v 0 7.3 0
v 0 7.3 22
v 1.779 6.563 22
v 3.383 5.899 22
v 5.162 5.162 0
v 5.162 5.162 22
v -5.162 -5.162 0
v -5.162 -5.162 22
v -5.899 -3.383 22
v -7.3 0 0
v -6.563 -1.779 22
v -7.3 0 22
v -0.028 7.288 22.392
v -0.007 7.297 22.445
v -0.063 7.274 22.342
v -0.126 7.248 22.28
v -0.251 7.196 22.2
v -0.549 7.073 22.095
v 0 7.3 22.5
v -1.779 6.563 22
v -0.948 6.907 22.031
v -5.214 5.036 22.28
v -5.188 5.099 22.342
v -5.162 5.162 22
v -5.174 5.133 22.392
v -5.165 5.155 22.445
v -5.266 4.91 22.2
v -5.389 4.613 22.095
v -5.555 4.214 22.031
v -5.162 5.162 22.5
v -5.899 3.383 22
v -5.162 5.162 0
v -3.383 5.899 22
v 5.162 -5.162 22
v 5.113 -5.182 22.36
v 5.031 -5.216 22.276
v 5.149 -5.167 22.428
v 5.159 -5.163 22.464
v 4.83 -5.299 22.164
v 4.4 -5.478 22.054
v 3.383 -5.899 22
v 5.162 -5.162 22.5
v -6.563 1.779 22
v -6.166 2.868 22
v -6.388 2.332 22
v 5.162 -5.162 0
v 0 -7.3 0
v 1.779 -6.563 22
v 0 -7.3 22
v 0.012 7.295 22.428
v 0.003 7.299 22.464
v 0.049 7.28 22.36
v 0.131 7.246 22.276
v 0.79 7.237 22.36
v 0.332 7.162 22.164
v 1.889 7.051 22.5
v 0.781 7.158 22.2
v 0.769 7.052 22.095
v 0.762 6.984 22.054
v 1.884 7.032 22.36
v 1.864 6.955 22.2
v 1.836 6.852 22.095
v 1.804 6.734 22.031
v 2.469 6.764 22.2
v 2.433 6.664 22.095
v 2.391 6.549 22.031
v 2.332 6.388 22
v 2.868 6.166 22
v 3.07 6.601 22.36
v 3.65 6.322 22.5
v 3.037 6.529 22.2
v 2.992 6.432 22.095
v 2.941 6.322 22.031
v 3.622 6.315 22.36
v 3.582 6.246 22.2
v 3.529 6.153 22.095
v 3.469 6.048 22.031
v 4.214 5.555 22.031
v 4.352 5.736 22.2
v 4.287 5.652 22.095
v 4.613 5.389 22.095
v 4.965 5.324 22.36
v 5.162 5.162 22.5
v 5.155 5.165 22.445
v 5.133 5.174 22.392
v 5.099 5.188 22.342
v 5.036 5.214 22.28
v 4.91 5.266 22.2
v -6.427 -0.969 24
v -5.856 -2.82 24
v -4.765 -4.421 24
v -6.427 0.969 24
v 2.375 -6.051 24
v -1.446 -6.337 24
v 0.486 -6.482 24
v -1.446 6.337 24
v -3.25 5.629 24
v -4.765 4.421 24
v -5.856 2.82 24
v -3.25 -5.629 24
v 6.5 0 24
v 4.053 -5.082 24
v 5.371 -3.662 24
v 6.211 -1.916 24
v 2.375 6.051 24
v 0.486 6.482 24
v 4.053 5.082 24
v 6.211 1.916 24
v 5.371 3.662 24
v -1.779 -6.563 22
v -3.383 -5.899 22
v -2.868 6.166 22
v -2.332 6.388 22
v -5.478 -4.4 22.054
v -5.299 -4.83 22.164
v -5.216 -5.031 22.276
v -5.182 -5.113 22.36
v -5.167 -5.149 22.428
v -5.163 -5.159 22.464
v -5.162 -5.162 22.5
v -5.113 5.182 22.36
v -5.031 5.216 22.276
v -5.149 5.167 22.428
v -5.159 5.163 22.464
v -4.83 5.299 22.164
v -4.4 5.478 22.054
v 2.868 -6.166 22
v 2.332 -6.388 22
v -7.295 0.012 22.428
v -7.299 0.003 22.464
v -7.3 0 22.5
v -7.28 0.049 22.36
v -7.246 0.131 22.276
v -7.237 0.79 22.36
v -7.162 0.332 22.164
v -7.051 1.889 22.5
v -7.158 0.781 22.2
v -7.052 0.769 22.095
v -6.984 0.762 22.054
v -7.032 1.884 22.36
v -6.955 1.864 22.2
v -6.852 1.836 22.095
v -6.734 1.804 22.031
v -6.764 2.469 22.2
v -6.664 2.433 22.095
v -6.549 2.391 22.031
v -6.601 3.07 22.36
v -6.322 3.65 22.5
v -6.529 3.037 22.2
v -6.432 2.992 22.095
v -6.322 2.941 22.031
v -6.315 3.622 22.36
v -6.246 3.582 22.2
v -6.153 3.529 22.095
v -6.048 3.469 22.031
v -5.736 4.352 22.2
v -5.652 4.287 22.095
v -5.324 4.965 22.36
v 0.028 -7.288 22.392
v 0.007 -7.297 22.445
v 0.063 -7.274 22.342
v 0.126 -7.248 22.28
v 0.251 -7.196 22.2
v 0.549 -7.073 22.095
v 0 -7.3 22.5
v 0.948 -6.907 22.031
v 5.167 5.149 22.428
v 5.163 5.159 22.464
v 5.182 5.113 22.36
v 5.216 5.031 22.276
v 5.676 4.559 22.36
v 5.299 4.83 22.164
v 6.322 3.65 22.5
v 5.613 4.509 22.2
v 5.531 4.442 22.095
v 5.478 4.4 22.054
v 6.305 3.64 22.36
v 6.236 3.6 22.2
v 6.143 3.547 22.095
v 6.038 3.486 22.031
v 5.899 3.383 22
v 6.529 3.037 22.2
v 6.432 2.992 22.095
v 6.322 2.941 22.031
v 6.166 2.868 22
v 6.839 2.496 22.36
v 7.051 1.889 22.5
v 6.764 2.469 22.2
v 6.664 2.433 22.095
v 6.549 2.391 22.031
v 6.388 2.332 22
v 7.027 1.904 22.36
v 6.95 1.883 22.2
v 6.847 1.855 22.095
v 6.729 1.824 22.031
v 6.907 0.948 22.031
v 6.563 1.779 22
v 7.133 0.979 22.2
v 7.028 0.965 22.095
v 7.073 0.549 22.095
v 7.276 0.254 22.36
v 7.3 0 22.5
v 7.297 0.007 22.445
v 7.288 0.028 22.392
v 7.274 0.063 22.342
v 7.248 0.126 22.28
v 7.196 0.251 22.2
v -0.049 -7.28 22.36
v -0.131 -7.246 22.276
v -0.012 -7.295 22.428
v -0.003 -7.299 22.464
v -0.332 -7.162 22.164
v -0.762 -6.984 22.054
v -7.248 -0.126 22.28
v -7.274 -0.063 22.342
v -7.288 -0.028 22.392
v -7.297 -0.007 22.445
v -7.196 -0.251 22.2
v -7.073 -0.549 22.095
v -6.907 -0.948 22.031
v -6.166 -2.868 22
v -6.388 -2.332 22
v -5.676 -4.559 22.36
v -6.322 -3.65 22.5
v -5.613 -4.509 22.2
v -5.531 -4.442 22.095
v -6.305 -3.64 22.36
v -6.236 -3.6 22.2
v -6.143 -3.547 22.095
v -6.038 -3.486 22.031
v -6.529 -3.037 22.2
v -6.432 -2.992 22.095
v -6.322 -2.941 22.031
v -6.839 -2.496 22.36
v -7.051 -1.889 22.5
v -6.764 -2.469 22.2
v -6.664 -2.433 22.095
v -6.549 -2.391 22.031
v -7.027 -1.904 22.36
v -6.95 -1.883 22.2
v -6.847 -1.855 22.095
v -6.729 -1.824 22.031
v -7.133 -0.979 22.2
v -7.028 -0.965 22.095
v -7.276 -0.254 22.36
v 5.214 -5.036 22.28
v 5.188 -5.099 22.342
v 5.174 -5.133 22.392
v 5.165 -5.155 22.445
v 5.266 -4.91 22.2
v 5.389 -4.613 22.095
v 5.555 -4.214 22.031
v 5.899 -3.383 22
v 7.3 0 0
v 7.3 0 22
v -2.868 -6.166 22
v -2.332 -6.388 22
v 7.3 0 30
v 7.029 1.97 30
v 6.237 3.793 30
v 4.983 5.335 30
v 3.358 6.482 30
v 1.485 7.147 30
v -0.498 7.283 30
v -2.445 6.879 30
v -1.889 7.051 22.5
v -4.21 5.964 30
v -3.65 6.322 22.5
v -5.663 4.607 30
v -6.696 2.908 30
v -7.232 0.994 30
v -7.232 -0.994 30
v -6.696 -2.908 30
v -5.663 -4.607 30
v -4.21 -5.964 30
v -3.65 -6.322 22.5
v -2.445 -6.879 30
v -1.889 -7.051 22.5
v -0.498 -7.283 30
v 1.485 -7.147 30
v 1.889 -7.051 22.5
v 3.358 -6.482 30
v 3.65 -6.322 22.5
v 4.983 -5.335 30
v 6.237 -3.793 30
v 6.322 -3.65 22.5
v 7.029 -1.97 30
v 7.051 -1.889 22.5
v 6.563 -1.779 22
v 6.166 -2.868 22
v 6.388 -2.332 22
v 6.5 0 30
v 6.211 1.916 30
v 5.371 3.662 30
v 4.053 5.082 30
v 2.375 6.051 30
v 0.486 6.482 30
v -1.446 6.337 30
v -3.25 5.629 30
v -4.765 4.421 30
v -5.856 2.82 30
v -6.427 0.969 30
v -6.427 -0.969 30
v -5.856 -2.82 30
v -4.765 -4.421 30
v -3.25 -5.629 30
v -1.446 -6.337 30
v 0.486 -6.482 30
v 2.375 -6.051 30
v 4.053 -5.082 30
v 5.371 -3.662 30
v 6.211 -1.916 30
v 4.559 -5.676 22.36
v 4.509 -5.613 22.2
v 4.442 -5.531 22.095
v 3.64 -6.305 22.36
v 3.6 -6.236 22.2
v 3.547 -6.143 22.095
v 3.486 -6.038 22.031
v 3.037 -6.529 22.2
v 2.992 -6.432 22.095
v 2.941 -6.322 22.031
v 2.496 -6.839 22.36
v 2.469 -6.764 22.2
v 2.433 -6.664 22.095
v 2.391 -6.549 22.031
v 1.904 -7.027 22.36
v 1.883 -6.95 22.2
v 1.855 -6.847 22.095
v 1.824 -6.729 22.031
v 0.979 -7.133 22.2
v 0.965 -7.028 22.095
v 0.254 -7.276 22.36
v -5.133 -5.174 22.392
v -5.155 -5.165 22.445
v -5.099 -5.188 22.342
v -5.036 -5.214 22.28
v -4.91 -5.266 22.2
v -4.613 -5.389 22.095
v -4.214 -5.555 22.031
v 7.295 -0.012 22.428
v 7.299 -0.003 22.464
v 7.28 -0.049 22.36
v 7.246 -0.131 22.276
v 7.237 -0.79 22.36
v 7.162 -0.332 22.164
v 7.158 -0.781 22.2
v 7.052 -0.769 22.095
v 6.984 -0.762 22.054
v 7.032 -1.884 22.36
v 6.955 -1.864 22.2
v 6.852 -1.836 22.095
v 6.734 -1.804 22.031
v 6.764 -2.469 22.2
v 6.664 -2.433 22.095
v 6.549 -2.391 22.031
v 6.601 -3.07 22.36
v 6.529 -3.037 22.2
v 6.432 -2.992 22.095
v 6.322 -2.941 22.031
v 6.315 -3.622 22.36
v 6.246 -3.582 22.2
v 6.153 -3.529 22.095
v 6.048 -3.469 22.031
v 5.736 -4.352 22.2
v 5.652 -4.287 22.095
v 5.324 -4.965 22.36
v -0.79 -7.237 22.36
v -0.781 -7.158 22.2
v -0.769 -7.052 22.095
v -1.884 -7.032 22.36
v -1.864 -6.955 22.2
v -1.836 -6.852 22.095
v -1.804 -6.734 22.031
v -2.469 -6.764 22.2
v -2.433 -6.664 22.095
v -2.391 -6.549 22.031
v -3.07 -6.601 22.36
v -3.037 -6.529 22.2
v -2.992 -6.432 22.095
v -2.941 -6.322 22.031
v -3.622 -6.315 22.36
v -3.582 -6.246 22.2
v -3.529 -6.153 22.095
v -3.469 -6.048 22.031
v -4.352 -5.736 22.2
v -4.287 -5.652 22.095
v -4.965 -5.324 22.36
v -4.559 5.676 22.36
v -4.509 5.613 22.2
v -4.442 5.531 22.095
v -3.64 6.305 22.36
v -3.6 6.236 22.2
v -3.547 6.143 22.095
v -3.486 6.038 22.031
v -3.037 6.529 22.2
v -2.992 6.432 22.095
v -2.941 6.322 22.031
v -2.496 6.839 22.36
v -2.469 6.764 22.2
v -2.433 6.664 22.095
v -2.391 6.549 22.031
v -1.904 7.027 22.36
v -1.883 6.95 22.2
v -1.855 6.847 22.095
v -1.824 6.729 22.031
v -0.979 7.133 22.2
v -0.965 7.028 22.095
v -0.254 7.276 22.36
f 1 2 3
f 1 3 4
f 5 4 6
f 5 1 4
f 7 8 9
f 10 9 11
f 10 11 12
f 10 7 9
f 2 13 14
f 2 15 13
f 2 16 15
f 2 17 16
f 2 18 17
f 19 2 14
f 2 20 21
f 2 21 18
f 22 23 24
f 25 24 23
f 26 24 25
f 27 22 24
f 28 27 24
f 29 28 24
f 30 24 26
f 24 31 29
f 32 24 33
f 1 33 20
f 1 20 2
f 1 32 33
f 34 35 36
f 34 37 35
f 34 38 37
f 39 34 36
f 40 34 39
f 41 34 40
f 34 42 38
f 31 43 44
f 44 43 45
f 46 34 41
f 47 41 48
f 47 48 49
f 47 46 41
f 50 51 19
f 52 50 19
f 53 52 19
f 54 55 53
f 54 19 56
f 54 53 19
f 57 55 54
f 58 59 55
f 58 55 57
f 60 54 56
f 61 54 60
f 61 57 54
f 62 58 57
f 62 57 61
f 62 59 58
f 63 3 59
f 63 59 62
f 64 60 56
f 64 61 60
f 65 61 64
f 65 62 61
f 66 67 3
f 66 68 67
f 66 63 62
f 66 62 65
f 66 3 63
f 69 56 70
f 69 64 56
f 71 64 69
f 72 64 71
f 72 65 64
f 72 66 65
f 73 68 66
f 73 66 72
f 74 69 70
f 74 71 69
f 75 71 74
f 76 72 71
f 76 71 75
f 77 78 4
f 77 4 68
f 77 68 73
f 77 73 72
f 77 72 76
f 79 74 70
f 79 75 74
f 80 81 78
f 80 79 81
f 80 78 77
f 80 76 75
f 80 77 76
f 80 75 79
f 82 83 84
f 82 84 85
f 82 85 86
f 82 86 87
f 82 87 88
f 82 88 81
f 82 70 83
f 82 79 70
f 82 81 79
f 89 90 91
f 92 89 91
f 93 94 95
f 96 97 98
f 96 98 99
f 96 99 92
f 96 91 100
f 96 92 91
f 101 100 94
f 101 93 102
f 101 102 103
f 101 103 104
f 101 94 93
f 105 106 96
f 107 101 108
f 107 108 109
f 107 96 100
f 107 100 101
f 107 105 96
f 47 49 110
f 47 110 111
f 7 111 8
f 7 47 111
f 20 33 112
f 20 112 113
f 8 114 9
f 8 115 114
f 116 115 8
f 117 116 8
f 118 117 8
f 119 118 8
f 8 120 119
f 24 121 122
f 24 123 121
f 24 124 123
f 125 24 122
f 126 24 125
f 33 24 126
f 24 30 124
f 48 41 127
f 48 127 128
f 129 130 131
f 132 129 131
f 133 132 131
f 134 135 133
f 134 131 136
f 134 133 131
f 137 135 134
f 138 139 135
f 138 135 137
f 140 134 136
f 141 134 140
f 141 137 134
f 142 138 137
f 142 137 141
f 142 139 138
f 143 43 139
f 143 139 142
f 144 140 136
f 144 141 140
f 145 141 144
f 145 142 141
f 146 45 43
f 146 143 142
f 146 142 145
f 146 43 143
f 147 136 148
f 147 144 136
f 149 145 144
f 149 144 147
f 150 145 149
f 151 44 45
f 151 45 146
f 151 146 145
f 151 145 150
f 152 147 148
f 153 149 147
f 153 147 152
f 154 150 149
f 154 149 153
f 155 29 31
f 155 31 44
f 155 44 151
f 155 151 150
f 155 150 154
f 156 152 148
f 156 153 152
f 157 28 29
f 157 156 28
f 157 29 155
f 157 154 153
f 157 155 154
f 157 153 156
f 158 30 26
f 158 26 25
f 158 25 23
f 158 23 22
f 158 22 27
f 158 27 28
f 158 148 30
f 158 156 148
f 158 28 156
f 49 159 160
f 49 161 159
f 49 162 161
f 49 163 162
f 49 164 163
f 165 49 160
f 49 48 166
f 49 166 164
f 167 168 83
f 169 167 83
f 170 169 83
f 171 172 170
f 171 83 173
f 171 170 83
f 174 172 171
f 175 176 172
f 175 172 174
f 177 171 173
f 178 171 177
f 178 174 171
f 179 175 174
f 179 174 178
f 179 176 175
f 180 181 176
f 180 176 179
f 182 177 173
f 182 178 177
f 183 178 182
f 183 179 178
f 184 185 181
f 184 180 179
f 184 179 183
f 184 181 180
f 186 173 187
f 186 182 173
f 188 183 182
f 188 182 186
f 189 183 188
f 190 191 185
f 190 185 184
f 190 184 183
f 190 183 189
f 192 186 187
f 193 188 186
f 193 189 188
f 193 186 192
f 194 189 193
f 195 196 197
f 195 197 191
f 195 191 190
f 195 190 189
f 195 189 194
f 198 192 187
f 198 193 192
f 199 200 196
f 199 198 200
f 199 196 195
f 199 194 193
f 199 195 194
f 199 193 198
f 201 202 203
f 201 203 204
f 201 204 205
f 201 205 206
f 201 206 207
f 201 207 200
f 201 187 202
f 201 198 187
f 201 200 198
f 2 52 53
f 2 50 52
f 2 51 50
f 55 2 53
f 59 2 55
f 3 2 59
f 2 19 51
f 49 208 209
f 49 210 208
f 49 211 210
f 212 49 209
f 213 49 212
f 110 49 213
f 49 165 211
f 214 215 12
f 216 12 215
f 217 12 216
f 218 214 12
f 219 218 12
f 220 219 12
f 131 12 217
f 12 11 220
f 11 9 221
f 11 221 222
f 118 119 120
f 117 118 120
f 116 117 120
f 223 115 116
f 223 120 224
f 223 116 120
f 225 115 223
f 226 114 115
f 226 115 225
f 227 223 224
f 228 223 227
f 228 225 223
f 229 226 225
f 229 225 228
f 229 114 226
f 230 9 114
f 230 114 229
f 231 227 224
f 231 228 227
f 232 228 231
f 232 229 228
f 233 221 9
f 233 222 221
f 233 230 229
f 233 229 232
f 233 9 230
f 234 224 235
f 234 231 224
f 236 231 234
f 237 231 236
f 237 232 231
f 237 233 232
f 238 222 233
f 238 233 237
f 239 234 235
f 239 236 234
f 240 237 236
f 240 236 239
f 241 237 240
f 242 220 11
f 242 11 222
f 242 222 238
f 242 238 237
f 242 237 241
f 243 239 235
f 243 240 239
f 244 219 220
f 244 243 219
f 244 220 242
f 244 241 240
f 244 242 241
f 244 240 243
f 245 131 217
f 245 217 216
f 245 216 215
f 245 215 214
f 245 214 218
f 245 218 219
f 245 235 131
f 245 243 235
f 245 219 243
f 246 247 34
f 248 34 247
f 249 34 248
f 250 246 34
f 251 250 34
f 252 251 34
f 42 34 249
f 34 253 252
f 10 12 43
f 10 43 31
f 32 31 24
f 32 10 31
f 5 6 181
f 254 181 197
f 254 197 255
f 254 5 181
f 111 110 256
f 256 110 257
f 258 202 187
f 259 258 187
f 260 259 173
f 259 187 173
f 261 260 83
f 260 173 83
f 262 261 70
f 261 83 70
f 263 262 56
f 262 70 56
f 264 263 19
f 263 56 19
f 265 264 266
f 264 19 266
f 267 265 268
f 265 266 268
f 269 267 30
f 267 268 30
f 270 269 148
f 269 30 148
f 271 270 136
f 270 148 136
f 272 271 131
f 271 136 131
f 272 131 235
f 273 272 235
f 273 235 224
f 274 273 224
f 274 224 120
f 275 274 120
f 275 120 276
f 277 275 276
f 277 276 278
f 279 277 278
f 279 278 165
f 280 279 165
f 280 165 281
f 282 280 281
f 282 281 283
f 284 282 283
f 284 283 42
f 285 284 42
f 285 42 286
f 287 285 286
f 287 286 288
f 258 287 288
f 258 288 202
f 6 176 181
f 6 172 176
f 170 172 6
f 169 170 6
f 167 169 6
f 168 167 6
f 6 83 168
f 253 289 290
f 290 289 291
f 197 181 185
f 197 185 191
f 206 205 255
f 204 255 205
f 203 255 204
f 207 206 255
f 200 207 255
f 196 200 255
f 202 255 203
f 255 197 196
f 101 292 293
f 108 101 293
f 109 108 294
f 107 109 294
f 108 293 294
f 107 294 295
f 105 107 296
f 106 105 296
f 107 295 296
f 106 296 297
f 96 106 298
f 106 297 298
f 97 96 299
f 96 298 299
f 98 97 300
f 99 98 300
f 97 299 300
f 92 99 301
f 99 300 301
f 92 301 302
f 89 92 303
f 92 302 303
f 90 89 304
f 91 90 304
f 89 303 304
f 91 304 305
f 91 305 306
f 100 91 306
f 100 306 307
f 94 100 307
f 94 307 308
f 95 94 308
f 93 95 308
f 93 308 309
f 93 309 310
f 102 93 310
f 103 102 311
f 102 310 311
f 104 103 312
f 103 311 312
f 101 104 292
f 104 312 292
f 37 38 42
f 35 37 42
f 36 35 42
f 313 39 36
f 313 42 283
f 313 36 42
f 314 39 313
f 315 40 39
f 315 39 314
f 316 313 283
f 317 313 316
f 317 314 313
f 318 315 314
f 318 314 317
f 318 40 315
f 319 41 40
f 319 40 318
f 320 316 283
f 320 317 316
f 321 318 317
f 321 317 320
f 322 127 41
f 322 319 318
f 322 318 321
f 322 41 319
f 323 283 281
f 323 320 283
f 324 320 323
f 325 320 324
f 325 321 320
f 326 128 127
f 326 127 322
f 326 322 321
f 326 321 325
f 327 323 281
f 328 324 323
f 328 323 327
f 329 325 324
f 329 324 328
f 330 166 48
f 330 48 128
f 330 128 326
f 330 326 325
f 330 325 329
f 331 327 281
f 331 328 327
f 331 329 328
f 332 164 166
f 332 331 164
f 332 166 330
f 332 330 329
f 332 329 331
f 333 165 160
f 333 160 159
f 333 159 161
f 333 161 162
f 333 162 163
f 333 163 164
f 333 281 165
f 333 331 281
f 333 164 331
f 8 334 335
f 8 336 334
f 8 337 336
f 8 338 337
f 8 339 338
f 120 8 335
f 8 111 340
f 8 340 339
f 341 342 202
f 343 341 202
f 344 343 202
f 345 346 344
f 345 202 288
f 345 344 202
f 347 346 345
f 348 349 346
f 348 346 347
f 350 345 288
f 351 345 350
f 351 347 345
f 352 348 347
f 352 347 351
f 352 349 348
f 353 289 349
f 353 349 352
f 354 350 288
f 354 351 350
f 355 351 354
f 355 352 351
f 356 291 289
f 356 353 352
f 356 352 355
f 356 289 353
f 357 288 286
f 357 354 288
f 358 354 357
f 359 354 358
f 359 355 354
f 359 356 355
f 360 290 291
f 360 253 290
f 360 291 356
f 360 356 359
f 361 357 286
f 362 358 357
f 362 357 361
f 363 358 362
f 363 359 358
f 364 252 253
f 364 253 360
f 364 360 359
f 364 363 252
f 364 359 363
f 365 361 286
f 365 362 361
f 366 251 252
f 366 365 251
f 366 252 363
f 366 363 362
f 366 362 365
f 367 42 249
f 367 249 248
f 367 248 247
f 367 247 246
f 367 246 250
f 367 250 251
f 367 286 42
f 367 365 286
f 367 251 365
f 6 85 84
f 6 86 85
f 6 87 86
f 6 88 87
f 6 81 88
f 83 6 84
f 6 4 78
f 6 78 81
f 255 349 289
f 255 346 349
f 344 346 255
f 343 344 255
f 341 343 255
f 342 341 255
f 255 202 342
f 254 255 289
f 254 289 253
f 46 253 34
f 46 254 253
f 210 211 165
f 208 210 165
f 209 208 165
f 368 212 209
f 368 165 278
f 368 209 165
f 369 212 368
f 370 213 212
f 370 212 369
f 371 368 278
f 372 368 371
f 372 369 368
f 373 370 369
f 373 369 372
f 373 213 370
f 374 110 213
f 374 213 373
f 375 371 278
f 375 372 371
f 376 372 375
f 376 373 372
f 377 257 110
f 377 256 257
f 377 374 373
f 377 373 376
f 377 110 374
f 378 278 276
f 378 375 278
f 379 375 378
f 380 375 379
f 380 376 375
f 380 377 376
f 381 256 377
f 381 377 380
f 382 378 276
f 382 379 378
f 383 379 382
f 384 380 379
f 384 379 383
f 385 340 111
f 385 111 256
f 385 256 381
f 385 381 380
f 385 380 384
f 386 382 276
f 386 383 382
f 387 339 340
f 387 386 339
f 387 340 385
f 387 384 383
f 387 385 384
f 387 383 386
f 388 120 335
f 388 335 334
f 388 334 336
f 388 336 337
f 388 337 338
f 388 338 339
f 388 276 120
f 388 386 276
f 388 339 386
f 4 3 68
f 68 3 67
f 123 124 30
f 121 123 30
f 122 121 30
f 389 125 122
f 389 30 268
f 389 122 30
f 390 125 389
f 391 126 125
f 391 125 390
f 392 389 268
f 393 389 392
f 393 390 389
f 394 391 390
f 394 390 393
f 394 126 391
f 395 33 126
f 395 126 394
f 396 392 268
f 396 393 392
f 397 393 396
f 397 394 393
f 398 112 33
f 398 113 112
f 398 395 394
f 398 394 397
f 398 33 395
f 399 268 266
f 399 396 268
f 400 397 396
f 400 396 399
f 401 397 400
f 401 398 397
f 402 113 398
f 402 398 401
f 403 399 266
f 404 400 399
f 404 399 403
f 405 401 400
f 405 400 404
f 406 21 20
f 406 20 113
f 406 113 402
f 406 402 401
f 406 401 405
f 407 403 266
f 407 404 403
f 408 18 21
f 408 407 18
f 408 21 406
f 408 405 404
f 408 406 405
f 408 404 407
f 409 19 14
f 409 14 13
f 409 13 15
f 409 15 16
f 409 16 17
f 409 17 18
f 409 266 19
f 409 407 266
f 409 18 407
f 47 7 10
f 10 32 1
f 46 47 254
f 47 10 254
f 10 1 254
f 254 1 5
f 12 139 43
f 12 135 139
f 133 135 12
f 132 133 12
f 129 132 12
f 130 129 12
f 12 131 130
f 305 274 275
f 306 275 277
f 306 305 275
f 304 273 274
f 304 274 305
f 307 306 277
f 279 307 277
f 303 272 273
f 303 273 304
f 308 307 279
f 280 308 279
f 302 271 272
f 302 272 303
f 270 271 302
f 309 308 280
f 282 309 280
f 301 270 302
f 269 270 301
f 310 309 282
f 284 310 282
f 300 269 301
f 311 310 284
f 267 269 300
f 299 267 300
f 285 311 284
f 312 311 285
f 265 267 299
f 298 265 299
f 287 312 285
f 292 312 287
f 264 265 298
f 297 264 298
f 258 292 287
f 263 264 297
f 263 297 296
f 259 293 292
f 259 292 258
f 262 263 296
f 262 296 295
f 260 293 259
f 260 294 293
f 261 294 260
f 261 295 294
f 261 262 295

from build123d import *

# Parameters (mm, degrees)
SKETCH1_R           = 7.3
BOSS_EXTRUDE1_DEPTH = 30
SKETCH2_R           = 6.5
CUT_EXTRUDE1_DEPTH  = 6
SKETCH3_OUTSIDE_W   = 23.884
SKETCH3_OUTSIDE_H   = 23.884
CUT_EXTRUDE3_DEPTH  = 22
FILLET2_R           = 0.5


with BuildPart() as part:
    # Sketch1 → Boss-Extrude1 (new body)
    with BuildSketch(Plane.XY):
        Circle(SKETCH1_R)
    extrude(amount=BOSS_EXTRUDE1_DEPTH)

    # Sketch2 → Cut-Extrude1 (cut)
    with BuildSketch(Plane.XY.offset(30)):
        Circle(SKETCH2_R)
    extrude(amount=-CUT_EXTRUDE1_DEPTH, mode=Mode.SUBTRACT)

    # Sketch3 outside → Cut-Extrude3 (cut)
    with BuildSketch(Plane(origin=(0, 0, 0), x_dir=(-1, 0, 0), z_dir=(0, 0, -1))):
        Rectangle(SKETCH3_OUTSIDE_W, SKETCH3_OUTSIDE_H)
        Polygon((7.3, 0), (5.161879503, 5.161879503), (0, 7.3), (-5.161879503, 5.161879503), (-7.3, 0), (-5.161879503, -5.161879503), (0, -7.3), (5.161879503, -5.161879503), align=None, mode=Mode.SUBTRACT)
    extrude(amount=-CUT_EXTRUDE3_DEPTH, mode=Mode.SUBTRACT)

    # Fillet2
    # the kernel refuses this fillet: 0.5 mm, written as the material it takes off along each edge
    with BuildSketch(Plane(origin=(0, 0, 22), x_dir=(1, 0, 0), z_dir=(0, 1, 0))) as fillet2_piece_1_section:
        with BuildLine():
            CenterArc((7.3 - FILLET2_R, -FILLET2_R), FILLET2_R, 0, 90)
            Line((7.3, -FILLET2_R), (7.3, 0))
            Line((7.3, 0), (7.3 - FILLET2_R, 0))
        make_face()
    fillet2_piece_1 = revolve(axis=Axis((0, 0, 22), (0, 0, -1)), revolution_arc=45, mode=Mode.PRIVATE)
    fillet2_piece_1 = split(fillet2_piece_1, bisect_by=Plane(origin=(6.230939751, -2.580939751, 22.141608604), z_dir=(0.9238795325112824, -0.3826834323651005, 0)), keep=Keep.TOP, mode=Mode.PRIVATE)
    add(fillet2_piece_1, mode=Mode.SUBTRACT)
    with BuildSketch(Plane(origin=(0, 0, 22), x_dir=(0.7071067811865394, -0.7071067811865557, 0), z_dir=(0.7071067811865557, 0.7071067811865394, 0))) as fillet2_piece_2_section:
        with BuildLine():
            CenterArc((7.3 - FILLET2_R, -FILLET2_R), FILLET2_R, 0, 90)
            Line((7.3 - FILLET2_R, 0), (7.3, 0))
            Line((7.3, 0), (7.3, -FILLET2_R))
        make_face()
    fillet2_piece_2 = revolve(axis=Axis((0, 0, 22), (0, 0, -1)), revolution_arc=45, mode=Mode.PRIVATE)
    fillet2_piece_2 = split(fillet2_piece_2, bisect_by=Plane(origin=(2.580939751, -6.230939751, 22.141608605), z_dir=(0.3826834323650794, -0.9238795325112911, 0)), keep=Keep.TOP, mode=Mode.PRIVATE)
    add(fillet2_piece_2, mode=Mode.SUBTRACT)
    with BuildSketch(Plane(origin=(0, 0, 22), x_dir=(0, -1, 0), z_dir=(1, 0, 0))) as fillet2_piece_3_section:
        with BuildLine():
            CenterArc((7.3 - FILLET2_R, -FILLET2_R), FILLET2_R, 0, 90)
            Line((7.3 - FILLET2_R, 0), (7.3, 0))
            Line((7.3, 0), (7.3, -FILLET2_R))
        make_face()
    fillet2_piece_3 = revolve(axis=Axis((0, 0, 22), (0, 0, -1)), revolution_arc=45, mode=Mode.PRIVATE)
    fillet2_piece_3 = split(fillet2_piece_3, bisect_by=Plane(origin=(-2.580939751, -6.230939751, 22.141608604), z_dir=(-0.38268343236510044, -0.9238795325112824, 0)), keep=Keep.TOP, mode=Mode.PRIVATE)
    add(fillet2_piece_3, mode=Mode.SUBTRACT)
    with BuildSketch(Plane(origin=(0, 0, 22), x_dir=(-0.7071067811865553, -0.7071067811865397, 0), z_dir=(0.7071067811865397, -0.7071067811865553, 0))) as fillet2_piece_4_section:
        with BuildLine():
            CenterArc((7.3 - FILLET2_R, -FILLET2_R), FILLET2_R, 0, 90)
            Line((7.3 - FILLET2_R, 0), (7.3, 0))
            Line((7.3, 0), (7.3, -FILLET2_R))
        make_face()
    fillet2_piece_4 = revolve(axis=Axis((0, 0, 22), (0, 0, -1)), revolution_arc=45, mode=Mode.PRIVATE)
    fillet2_piece_4 = split(fillet2_piece_4, bisect_by=Plane(origin=(-6.230939751, -2.580939751, 22.141608603), z_dir=(-0.9238795325112912, -0.3826834323650791, 0)), keep=Keep.TOP, mode=Mode.PRIVATE)
    add(fillet2_piece_4, mode=Mode.SUBTRACT)
    with BuildSketch(Plane(origin=(0, 0, 22), x_dir=(-1, 0, 0), z_dir=(0, -1, 0))) as fillet2_piece_5_section:
        with BuildLine():
            CenterArc((7.3 - FILLET2_R, -FILLET2_R), FILLET2_R, 0, 90)
            Line((7.3 - FILLET2_R, 0), (7.3, 0))
            Line((7.3, 0), (7.3, -FILLET2_R))
        make_face()
    fillet2_piece_5 = revolve(axis=Axis((0, 0, 22), (0, 0, -1)), revolution_arc=45, mode=Mode.PRIVATE)
    fillet2_piece_5 = split(fillet2_piece_5, bisect_by=Plane(origin=(-6.230939751, 2.580939751, 22.141608604), z_dir=(-0.9238795325112823, 0.38268343236510055, 0)), keep=Keep.TOP, mode=Mode.PRIVATE)
    add(fillet2_piece_5, mode=Mode.SUBTRACT)
    with BuildSketch(Plane(origin=(0, 0, 22), x_dir=(-0.7071067811865395, 0.7071067811865556, 0), z_dir=(-0.7071067811865556, -0.7071067811865395, 0))) as fillet2_piece_6_section:
        with BuildLine():
            CenterArc((7.3 - FILLET2_R, -FILLET2_R), FILLET2_R, 0, 90)
            Line((7.3 - FILLET2_R, 0), (7.3, 0))
            Line((7.3, 0), (7.3, -FILLET2_R))
        make_face()
    fillet2_piece_6 = revolve(axis=Axis((0, 0, 22), (0, 0, -1)), revolution_arc=45, mode=Mode.PRIVATE)
    fillet2_piece_6 = split(fillet2_piece_6, bisect_by=Plane(origin=(-2.580939751, 6.230939751, 22.141608604), z_dir=(-0.3826834323650789, 0.9238795325112913, 0)), keep=Keep.TOP, mode=Mode.PRIVATE)
    add(fillet2_piece_6, mode=Mode.SUBTRACT)
    with BuildSketch(Plane(origin=(0, 0, 22), x_dir=(0, 1, 0), z_dir=(-1, 0, 0))) as fillet2_piece_7_section:
        with BuildLine():
            CenterArc((7.3 - FILLET2_R, -FILLET2_R), FILLET2_R, 0, 90)
            Line((7.3, -FILLET2_R), (7.3, 0))
            Line((7.3, 0), (7.3 - FILLET2_R, 0))
        make_face()
    fillet2_piece_7 = revolve(axis=Axis((0, 0, 22), (0, 0, -1)), revolution_arc=45, mode=Mode.PRIVATE)
    fillet2_piece_7 = split(fillet2_piece_7, bisect_by=Plane(origin=(2.580939751, 6.230939751, 22.141608604), z_dir=(0.38268343236510044, 0.9238795325112824, 0)), keep=Keep.TOP, mode=Mode.PRIVATE)
    add(fillet2_piece_7, mode=Mode.SUBTRACT)
    with BuildSketch(Plane(origin=(0, 0, 22), x_dir=(0.7071067811865556, 0.7071067811865395, 0), z_dir=(-0.7071067811865395, 0.7071067811865556, 0))) as fillet2_piece_8_section:
        with BuildLine():
            CenterArc((7.3 - FILLET2_R, -FILLET2_R), FILLET2_R, 0, 90)
            Line((7.3, -FILLET2_R), (7.3, 0))
            Line((7.3, 0), (7.3 - FILLET2_R, 0))
        make_face()
    fillet2_piece_8 = revolve(axis=Axis((0, 0, 22), (0, 0, -1)), revolution_arc=45, mode=Mode.PRIVATE)
    fillet2_piece_8 = split(fillet2_piece_8, bisect_by=Plane(origin=(6.230939751, 2.580939751, 22.141608603), z_dir=(0.9238795325112913, 0.38268343236507885, 0)), keep=Keep.TOP, mode=Mode.PRIVATE)
    add(fillet2_piece_8, mode=Mode.SUBTRACT)


solid = part.part
